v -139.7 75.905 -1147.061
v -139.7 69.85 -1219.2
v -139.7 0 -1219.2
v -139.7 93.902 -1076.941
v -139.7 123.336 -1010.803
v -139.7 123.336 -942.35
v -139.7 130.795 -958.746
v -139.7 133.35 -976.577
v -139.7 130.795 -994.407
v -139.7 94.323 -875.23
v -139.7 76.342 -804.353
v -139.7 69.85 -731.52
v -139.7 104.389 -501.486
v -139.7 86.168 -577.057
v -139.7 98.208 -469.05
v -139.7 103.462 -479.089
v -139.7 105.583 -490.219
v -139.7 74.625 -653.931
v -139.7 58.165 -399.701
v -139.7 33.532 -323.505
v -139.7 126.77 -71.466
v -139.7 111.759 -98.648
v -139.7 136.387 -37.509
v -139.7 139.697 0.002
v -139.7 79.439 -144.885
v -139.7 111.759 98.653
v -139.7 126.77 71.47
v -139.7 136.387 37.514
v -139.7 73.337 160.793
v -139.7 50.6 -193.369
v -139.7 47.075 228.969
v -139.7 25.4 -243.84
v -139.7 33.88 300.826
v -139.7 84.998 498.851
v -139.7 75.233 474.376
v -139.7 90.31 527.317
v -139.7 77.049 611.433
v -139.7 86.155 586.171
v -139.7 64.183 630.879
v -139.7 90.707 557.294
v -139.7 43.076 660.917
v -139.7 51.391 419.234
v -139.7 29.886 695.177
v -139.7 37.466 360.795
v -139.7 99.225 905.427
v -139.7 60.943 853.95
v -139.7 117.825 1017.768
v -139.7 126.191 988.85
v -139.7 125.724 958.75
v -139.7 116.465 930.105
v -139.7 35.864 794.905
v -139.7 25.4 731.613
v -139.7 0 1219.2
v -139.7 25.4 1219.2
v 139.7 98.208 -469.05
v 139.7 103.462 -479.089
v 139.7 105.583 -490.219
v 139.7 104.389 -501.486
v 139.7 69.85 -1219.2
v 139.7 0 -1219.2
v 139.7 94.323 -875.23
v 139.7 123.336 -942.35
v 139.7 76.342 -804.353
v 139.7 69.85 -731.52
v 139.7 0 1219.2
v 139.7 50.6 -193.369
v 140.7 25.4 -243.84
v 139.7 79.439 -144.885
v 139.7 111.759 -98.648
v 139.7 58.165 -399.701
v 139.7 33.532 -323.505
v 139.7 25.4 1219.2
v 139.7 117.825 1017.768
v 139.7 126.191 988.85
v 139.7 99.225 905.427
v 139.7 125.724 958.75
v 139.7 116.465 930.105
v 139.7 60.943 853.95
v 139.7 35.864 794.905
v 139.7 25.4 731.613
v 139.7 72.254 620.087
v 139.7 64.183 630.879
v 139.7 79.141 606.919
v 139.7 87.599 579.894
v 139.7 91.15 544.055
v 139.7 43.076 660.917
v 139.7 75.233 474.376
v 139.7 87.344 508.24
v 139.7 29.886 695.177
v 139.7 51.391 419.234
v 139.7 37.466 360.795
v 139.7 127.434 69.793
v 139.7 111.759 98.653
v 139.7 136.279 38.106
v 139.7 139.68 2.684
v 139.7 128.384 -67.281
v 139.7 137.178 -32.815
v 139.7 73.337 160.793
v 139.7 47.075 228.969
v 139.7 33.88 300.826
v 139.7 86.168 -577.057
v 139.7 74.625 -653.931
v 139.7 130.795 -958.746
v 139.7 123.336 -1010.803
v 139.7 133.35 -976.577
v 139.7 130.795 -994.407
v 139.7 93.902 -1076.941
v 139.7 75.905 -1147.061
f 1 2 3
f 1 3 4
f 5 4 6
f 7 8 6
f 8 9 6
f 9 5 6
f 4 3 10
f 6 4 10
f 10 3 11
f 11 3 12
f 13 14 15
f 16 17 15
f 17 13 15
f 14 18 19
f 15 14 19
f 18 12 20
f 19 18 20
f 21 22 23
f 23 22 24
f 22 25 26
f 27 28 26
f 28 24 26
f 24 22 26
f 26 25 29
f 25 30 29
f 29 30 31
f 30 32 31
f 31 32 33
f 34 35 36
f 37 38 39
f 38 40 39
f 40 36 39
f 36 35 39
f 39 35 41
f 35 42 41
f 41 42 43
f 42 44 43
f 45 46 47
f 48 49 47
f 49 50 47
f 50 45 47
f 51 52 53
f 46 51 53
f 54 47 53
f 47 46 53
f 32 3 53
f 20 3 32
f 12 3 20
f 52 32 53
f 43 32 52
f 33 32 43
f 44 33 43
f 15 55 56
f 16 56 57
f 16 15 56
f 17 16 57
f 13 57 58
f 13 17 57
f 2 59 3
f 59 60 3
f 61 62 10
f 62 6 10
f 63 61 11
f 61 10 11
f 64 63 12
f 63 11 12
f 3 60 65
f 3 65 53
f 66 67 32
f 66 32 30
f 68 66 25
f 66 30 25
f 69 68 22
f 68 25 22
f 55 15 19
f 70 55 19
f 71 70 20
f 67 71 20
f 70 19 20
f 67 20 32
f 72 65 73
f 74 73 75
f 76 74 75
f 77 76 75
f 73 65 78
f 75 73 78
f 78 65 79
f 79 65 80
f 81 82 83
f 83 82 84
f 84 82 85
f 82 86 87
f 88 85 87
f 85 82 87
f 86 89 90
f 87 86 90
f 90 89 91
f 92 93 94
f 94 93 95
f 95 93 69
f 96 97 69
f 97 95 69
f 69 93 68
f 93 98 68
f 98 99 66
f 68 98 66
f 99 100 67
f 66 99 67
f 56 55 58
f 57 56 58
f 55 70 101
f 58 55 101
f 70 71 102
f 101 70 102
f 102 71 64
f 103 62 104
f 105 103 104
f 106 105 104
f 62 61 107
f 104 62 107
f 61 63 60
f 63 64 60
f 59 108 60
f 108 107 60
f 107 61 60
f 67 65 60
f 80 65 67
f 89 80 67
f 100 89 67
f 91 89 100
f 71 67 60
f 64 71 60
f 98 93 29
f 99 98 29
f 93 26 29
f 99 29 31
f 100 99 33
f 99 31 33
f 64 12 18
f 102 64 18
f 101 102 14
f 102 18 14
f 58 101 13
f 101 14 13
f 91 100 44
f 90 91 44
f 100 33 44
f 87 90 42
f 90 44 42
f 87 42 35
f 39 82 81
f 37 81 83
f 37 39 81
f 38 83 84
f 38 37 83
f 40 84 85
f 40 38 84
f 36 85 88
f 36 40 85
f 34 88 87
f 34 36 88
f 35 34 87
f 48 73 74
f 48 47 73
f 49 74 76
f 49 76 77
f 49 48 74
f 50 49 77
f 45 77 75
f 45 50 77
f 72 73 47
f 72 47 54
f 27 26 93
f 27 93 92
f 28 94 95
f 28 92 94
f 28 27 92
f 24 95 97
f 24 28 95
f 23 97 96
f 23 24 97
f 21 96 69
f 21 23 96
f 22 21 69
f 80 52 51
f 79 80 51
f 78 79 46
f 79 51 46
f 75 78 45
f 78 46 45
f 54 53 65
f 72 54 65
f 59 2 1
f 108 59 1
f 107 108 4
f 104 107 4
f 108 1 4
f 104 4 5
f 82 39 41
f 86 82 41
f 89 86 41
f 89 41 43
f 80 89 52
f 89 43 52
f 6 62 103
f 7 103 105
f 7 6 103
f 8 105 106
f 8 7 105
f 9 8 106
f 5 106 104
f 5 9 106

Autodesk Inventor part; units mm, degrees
ref_plane "YZ Plane" through (0, 0, 0) normal (1, 0, 0) x (0, 1, 0)
ref_plane "XZ Plane" through (0, 0, 0) normal (0, 1, 0) x (-1, 0, 0)
ref_plane "XY Plane" through (0, 0, 0) normal (0, 0, 1) x (1, 0, 0)
sketch "Sketch1" plane through (0, 0, 0) normal (0, 1, 0) x (-1, 0, 0)
  line L0 (139.7, 1219.2) -> (-139.7, 1219.2)
  line L1 (-139.7, 1219.2) -> (-139.7, -1219.2)
  line L2 (-139.7, -1219.2) -> (139.7, -1219.2)
  line L3 (139.7, -1219.2) -> (139.7, 1219.2)
  line L4 (139.7, 1219.2) -> (-139.7, -1219.2) construction
  line L5 (-139.7, 1219.2) -> (139.7, -1219.2) construction
  point P0 (0, 0)
  dimension "d0" = 279.4
  dimension "d1" = 2438.4
extrude "Extrusion1" add sketch "Sketch1" along normal blind 139.7
sketch "Sketch3" plane through (-139.7, 0, -1219.2) normal (-1, 0, 0) x (0, 0, 1)
  line L0 (2438.4, 139.7) -> (0, 139.7) construction
  line L1 (1219.2, 139.7) -> (1219.2, 0) construction
  line L2 (1219.2, 0) -> (1219.2, 25.4) construction
  line L3 (1219.2, 25.4) -> (0, 25.4)
  line L4 (1219.2, 25.4) -> (2438.4, 25.4)
  line L5 (2438.4, 0) -> (0, 0) construction
  ellipse E0 centre (1219.2024, 69.8468) end of major axis (1342.5189, 69.8468) minor radius 69.85 (1317.8532, 111.7586) -> (1120.5517, 111.7586) ccw
  line L6 (1219.2024, 69.8468) -> (1219.2024, 176.8167) construction
  line L7 (0, 69.85) -> (0, 127.0895)
  line L8 (2438.4, 127.0895) -> (2438.4, 57.2395)
  arc A0 (750.1497, 98.2079) -> (717.7137, 104.389) centre (727.3807, 66.9219) ccw
  arc A1 (0, 69.85) -> (208.3969, 123.3364) centre (0, 502.5771) ccw
  arc A2 (276.8498, 123.3364) -> (208.3969, 123.3364) centre (242.6233, 69.85) ccw
  arc A3 (487.68, 69.85) -> (717.7137, 104.389) centre (471.9739, 957.7485) ccw
  line L9 (135.5865, 91.6403) -> (352.0961, 91.6403) construction
  arc A4 (276.8498, 123.3364) -> (487.68, 69.85) centre (491.8688, 528.6244) ccw
  line L10 (1763.8663, 33.8803) -> (1763.8663, 113.409) construction
  ellipse E1 centre (1763.8663, 33.8803) end of major axis (1865.4663, 33.8803) minor radius 57.271 (1850.0792, 64.183) -> (1693.5763, 75.2333) ccw
  arc A5 (1520.0263, 33.8803) -> (1693.5763, 75.2333) centre (1529.4777, 379.0674) ccw
  arc A6 (975.36, 25.4) -> (1120.5517, 111.7586) centre (657.8319, 724.4807) ccw
  arc A7 (750.1497, 98.2079) -> (975.36, 25.4) centre (973.9324, 405.6999) ccw
  arc A8 (1317.8532, 111.7586) -> (1520.0263, 33.8803) centre (1554.8027, 425.5214) ccw
  arc A9 (2236.968, 117.8247) -> (2124.6268, 99.2248) centre (2194.56, 25.4) ccw
  arc A10 (1850.0792, 64.183) -> (1950.8132, 25.4) centre (1950.8132, 175.6133) ccw
  arc A11 (1950.8132, 25.4) -> (2124.6268, 99.2248) centre (1938.6597, 295.5405) ccw
  line L11 (2236.968, 117.8247) -> (2438.4, 25.4)
  line L12 (2438.4, 57.2395) -> (2438.4, 25.4)
  line L13 (1219.2, 127.0895) -> (1219.2024, 127.0895)
  line L14 (1219.2, 127.0895) -> (1219.2024, 127.0895)
  line L15 (1219.2, 127.0895) -> (1219.2024, 127.0895)
  line L16 (2438.4, 0) -> (2438.4, 139.7) projected
  line L17 (2438.4, 127.0895) -> (2438.4, 139.7)
  line L18 (2438.4, 139.7) -> (0, 139.7)
  line L19 (0, 0) -> (0, 139.7) projected
  line L20 (0, 127.0895) -> (0, 139.7)
  point P0 (729.1332, 155.8475)
  point P1 (243.84, 164.183)
  point P2 (1494.3481, 127.0895)
  dimension "d24" = 101.6
  dimension "d16" = 25.4
  dimension "d23" = 216.5096
extrude "Extrusion2" cut sketch "Sketch3" against normal through all contours A7 A0 A3 A4 A2 A1 L7 L19 L18 L16 L8 L12 L11 A9 A11 A10 E1 A5 A8 E0 A6
properties part number "landscape for mars rover"
